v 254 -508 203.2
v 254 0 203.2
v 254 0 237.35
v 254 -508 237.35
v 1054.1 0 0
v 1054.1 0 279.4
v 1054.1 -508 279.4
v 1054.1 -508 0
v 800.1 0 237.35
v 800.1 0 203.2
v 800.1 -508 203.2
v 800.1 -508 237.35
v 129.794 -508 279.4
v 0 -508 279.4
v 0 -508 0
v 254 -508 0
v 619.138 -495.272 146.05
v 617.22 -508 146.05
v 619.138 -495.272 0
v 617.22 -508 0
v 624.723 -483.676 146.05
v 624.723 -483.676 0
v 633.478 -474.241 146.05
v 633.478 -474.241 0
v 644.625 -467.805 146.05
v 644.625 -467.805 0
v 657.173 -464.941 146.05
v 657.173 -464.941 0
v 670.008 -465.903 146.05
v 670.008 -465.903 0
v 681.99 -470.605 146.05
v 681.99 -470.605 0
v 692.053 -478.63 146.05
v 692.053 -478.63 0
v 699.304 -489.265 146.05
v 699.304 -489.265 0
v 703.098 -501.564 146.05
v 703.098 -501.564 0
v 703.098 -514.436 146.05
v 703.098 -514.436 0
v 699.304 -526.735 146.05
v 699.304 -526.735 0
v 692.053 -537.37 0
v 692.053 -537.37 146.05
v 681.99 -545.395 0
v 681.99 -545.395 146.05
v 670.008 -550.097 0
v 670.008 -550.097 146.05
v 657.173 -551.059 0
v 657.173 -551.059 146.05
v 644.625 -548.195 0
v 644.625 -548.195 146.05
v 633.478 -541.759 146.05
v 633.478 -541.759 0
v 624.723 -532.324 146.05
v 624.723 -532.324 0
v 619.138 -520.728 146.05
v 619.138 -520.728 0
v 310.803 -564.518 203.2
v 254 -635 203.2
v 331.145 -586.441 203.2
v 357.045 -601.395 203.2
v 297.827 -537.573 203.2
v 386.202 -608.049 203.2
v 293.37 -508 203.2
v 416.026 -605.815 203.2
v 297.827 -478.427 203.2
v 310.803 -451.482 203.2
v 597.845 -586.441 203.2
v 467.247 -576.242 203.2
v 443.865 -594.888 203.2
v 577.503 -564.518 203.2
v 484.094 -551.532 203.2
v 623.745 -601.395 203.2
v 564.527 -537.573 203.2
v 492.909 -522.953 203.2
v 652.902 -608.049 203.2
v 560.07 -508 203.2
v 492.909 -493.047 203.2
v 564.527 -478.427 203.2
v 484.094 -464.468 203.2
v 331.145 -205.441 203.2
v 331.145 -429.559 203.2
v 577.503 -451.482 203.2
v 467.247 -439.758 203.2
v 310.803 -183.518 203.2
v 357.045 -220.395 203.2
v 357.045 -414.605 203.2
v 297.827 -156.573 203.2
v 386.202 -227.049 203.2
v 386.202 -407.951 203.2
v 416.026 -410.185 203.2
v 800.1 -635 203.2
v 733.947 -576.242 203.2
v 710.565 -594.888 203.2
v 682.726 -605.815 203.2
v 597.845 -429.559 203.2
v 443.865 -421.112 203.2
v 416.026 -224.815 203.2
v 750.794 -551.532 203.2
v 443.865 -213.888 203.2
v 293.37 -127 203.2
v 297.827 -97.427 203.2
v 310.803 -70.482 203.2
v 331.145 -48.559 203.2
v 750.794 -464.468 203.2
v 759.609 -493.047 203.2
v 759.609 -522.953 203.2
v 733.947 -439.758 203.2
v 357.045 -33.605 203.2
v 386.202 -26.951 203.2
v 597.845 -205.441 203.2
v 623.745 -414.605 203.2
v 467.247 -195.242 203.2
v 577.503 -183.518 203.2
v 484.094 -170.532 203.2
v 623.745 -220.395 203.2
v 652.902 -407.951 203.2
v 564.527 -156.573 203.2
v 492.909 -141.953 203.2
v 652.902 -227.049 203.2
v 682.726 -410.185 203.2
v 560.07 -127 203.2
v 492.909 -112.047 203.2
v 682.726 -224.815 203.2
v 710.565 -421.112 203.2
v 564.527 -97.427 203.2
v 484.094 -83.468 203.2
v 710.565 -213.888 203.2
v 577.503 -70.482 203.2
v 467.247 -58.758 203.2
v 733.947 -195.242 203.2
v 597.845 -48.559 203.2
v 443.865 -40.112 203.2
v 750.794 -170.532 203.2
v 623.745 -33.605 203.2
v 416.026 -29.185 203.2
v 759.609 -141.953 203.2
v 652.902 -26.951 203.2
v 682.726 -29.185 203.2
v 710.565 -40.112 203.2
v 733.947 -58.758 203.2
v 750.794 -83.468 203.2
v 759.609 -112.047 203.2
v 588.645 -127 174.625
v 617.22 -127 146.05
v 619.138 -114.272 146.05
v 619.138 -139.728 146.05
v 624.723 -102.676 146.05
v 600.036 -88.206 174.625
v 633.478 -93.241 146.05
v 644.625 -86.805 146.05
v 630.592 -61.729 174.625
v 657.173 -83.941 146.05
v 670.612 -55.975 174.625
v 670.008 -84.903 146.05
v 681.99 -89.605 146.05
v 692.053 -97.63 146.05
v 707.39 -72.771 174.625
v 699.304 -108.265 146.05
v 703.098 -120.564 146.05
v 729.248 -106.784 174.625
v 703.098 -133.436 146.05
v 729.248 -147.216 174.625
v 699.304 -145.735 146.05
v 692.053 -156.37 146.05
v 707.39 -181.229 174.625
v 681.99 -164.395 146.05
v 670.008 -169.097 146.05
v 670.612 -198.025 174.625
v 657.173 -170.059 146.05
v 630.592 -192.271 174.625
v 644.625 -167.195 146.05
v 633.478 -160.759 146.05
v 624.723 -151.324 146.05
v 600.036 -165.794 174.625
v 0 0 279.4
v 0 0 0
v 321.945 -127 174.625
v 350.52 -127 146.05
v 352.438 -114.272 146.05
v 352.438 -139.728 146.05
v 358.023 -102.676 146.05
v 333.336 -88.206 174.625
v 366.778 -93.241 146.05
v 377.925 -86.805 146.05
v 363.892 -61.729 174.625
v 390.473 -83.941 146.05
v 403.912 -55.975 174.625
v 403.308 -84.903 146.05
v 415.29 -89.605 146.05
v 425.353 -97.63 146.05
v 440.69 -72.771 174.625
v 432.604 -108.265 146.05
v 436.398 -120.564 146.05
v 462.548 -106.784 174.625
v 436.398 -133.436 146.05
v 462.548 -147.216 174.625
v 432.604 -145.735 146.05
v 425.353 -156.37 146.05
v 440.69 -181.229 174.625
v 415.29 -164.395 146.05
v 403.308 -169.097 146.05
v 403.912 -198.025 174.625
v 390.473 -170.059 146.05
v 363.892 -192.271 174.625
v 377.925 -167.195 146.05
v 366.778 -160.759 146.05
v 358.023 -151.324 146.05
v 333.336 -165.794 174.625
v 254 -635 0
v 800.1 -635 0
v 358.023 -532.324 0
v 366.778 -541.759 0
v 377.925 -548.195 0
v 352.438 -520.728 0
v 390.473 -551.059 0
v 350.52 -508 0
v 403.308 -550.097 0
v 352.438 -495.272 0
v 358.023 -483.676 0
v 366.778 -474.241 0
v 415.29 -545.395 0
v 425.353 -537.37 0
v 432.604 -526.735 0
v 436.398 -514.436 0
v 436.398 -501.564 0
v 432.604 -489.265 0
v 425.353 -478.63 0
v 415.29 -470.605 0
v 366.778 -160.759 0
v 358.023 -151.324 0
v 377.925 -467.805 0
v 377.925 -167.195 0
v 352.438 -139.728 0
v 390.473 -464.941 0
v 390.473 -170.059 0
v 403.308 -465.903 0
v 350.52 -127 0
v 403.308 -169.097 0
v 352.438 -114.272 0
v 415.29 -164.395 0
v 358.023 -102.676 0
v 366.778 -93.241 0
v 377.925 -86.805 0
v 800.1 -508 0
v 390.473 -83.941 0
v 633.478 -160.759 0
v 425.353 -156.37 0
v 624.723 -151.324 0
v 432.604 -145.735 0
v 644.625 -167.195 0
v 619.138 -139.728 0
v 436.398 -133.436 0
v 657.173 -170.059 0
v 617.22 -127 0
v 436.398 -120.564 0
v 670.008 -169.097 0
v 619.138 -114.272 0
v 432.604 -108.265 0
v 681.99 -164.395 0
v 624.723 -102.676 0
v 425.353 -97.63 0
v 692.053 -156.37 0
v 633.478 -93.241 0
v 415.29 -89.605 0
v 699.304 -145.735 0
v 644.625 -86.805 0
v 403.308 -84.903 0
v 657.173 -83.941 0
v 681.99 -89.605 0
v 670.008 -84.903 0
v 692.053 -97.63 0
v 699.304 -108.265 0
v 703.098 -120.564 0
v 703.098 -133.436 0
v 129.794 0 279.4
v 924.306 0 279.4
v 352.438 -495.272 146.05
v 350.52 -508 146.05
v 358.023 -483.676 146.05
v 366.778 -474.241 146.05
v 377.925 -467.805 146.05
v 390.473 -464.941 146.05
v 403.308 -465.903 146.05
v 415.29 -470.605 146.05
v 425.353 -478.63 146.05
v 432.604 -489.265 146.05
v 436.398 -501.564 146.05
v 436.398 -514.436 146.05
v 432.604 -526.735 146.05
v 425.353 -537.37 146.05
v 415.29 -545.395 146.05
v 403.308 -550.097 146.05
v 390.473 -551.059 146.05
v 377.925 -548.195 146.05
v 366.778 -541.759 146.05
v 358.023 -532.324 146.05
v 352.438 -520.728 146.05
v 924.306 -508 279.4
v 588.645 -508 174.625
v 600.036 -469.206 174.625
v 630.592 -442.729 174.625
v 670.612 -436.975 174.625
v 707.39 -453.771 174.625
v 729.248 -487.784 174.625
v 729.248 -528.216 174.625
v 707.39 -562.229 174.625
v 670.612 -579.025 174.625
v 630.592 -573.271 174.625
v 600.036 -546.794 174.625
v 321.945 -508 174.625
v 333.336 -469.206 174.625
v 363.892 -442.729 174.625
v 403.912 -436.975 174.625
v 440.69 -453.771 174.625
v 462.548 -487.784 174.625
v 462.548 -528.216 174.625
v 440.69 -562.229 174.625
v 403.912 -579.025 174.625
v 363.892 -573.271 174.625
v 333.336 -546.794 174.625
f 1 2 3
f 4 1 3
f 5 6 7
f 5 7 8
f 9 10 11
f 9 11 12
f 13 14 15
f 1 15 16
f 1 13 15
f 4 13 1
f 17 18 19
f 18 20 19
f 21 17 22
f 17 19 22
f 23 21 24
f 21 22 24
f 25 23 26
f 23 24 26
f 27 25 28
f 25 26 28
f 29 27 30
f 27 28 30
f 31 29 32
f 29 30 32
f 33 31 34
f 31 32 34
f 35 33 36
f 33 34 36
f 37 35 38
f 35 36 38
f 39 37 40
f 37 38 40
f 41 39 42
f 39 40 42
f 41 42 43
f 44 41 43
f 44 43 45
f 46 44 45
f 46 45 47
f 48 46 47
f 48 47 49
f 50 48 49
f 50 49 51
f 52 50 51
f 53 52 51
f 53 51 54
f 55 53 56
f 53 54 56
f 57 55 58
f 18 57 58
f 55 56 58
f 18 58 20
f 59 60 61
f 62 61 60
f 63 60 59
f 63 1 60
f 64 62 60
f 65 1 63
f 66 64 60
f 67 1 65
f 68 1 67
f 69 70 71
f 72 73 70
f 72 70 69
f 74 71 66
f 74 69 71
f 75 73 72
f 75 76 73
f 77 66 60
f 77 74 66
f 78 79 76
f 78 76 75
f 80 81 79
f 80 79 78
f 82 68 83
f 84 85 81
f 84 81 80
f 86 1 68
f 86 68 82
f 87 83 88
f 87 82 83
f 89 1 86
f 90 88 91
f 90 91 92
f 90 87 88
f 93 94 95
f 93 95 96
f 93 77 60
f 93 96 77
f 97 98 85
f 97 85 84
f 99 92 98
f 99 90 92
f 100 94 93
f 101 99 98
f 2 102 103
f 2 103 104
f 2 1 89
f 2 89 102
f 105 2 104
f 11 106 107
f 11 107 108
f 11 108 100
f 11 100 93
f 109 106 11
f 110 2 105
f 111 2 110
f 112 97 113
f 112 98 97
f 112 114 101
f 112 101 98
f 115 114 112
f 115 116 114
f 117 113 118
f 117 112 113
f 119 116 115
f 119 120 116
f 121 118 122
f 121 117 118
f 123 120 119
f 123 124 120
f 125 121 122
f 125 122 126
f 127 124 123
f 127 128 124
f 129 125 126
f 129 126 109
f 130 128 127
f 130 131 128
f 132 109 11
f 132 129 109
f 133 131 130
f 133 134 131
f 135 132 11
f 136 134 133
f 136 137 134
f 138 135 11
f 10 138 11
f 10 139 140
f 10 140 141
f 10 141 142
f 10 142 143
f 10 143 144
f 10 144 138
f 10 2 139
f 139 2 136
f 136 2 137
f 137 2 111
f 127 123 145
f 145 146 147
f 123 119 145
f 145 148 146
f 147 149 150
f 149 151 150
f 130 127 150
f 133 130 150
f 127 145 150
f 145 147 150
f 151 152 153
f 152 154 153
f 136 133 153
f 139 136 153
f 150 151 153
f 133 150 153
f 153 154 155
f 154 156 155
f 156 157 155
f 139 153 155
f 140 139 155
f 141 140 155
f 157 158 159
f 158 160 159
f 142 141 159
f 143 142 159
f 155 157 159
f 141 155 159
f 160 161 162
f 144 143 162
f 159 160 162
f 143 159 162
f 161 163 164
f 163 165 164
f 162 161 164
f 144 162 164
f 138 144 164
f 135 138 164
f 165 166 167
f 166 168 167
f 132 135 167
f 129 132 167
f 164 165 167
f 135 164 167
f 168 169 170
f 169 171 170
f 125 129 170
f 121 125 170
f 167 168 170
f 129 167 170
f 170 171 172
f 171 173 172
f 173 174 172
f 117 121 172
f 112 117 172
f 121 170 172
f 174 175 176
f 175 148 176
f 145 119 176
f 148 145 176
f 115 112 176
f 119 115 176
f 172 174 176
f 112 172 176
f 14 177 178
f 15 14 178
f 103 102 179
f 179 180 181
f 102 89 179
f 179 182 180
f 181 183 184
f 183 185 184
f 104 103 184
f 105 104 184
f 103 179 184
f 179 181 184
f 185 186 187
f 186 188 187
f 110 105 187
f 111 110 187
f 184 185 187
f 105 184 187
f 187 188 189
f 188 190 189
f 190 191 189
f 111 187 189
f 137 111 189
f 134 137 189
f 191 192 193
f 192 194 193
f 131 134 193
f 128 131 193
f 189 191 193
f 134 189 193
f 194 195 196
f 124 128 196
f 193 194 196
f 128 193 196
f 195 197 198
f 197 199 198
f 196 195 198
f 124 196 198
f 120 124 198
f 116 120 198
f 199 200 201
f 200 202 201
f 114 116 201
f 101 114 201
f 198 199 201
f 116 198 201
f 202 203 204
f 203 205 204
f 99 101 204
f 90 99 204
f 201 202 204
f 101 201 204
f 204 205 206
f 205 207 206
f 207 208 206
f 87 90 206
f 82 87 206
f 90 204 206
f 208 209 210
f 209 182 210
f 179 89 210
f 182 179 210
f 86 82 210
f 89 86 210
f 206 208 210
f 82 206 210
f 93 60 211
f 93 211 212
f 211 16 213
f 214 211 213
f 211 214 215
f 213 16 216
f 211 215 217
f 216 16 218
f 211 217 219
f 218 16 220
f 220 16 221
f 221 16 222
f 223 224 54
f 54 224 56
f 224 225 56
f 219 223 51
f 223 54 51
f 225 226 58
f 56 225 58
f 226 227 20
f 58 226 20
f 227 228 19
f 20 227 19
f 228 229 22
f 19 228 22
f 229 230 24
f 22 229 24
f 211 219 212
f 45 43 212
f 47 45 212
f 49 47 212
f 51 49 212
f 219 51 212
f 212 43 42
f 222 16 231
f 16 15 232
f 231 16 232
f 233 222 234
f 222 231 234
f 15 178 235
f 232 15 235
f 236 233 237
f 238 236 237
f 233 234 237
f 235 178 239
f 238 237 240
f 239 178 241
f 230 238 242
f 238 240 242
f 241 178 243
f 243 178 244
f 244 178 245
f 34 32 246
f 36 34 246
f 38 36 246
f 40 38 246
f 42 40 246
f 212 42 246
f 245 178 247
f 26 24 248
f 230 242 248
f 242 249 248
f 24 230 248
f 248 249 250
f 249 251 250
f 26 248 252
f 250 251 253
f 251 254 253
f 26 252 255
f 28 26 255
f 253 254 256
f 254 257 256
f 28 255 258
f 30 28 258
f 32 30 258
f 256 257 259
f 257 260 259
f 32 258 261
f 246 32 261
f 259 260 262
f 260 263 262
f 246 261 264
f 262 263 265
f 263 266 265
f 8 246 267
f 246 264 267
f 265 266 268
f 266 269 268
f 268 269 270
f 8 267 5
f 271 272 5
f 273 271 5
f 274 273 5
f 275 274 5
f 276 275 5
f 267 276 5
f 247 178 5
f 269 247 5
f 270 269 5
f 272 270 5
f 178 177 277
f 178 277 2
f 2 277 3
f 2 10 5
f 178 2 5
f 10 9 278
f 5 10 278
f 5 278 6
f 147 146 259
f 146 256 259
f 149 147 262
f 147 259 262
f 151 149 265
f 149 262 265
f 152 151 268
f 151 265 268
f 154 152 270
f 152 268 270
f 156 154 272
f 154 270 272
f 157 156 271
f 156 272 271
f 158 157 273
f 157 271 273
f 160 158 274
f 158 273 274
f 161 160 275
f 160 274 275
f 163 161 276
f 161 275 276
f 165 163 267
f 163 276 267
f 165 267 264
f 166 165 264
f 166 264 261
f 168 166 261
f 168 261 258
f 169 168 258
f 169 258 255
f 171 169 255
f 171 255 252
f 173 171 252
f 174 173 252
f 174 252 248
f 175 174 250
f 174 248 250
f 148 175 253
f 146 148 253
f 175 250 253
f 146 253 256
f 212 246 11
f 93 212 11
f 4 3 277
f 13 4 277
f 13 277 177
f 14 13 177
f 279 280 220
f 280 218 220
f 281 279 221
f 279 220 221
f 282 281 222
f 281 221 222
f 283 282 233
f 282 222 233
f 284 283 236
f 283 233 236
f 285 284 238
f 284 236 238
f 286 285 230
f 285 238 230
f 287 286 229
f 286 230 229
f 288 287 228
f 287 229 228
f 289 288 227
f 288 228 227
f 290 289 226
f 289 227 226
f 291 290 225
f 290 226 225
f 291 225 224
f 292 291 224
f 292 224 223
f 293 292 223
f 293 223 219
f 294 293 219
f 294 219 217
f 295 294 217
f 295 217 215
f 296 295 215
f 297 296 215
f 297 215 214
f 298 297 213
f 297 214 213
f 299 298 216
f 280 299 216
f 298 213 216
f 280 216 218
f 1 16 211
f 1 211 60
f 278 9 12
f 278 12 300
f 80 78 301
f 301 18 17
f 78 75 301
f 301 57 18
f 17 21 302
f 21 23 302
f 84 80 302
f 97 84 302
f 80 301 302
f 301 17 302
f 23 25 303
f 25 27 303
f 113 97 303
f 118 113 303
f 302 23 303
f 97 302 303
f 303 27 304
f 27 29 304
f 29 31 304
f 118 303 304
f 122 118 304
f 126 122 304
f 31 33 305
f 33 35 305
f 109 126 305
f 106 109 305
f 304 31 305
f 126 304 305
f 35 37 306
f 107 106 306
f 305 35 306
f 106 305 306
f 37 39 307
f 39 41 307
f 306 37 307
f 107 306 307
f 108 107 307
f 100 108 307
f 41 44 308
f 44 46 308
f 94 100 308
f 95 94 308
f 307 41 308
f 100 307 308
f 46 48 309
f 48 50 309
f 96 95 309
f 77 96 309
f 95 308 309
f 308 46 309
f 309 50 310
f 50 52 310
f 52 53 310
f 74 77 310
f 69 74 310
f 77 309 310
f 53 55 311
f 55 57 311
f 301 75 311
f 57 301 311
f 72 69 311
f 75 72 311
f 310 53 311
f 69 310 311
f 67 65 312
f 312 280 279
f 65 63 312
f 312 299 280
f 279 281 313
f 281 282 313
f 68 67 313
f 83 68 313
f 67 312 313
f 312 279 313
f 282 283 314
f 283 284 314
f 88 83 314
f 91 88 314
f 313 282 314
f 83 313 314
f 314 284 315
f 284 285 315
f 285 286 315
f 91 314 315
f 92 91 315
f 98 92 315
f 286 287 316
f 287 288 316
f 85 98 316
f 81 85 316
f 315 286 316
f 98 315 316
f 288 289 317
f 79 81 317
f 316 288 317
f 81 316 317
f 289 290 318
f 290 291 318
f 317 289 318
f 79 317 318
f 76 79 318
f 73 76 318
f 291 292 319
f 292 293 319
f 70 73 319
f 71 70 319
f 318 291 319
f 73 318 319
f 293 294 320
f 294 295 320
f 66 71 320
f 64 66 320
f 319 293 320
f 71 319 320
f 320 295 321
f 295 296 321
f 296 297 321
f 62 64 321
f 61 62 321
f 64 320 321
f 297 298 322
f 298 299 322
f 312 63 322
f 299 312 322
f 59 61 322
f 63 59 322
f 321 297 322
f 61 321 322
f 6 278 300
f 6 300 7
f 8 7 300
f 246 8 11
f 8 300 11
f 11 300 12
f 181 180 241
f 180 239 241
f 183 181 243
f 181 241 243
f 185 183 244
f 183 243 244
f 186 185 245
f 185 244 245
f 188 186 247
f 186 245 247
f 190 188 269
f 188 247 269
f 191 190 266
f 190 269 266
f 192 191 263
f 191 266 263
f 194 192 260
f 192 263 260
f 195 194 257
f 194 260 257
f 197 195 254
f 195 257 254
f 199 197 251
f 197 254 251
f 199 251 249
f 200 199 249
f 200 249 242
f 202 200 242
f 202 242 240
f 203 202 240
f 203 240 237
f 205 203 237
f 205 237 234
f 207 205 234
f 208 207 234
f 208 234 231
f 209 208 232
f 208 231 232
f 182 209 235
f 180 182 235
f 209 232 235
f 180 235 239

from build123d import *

# Parameters (mm, degrees)
F1_DEPTH       = 508
F2_W           = 546.1
F2_H           = 203.2
F3_DEPTH       = 635
F6_DEPTH       = 508
F8_D           = 86.36
F8_CSINK_D     = 200.66
F8_CSINK_ANGLE = 90


with BuildPart() as f1:
    # F0 (on Front) → F1 (new body)
    with BuildSketch(Plane.XZ):
        Polygon((0, 279.4), (0, 0), (254, 0), (254, 237.349615), (129.794, 279.4), align=None)
    extrude(amount=F1_DEPTH)

    # F2 (on Front) → F3 (join)
    with BuildSketch(Plane.XZ):
        with Locations((527.05, 101.6)):
            Rectangle(F2_W, F2_H)
    extrude(amount=F3_DEPTH)

    # F5 (on face) → F6 (join)
    with BuildSketch(Plane(origin=(0, 0, 0), x_dir=(-1, 0, 0), z_dir=(0, 1, 0))):
        Polygon((0, 279.4), (-129.794, 279.4), (-254, 237.349615), (-254, 203.2), (-254, 0), (0, 0), align=None)
        Polygon((-1054.1, 279.4), (-1054.1, 0), (-800.1, 0), (-800.1, 203.2), (-800.1, 237.349615), (-924.306, 279.4), align=None)
    extrude(amount=-F6_DEPTH)

    # F8 (through all)
    with Locations(Plane.XY.offset(203.2)):
        with Locations((660.4, -508), (393.7, -508), (393.7, -127), (660.4, -127)):
            CounterSinkHole(F8_D / 2, F8_CSINK_D / 2, counter_sink_angle=F8_CSINK_ANGLE)


solid = f1.part
